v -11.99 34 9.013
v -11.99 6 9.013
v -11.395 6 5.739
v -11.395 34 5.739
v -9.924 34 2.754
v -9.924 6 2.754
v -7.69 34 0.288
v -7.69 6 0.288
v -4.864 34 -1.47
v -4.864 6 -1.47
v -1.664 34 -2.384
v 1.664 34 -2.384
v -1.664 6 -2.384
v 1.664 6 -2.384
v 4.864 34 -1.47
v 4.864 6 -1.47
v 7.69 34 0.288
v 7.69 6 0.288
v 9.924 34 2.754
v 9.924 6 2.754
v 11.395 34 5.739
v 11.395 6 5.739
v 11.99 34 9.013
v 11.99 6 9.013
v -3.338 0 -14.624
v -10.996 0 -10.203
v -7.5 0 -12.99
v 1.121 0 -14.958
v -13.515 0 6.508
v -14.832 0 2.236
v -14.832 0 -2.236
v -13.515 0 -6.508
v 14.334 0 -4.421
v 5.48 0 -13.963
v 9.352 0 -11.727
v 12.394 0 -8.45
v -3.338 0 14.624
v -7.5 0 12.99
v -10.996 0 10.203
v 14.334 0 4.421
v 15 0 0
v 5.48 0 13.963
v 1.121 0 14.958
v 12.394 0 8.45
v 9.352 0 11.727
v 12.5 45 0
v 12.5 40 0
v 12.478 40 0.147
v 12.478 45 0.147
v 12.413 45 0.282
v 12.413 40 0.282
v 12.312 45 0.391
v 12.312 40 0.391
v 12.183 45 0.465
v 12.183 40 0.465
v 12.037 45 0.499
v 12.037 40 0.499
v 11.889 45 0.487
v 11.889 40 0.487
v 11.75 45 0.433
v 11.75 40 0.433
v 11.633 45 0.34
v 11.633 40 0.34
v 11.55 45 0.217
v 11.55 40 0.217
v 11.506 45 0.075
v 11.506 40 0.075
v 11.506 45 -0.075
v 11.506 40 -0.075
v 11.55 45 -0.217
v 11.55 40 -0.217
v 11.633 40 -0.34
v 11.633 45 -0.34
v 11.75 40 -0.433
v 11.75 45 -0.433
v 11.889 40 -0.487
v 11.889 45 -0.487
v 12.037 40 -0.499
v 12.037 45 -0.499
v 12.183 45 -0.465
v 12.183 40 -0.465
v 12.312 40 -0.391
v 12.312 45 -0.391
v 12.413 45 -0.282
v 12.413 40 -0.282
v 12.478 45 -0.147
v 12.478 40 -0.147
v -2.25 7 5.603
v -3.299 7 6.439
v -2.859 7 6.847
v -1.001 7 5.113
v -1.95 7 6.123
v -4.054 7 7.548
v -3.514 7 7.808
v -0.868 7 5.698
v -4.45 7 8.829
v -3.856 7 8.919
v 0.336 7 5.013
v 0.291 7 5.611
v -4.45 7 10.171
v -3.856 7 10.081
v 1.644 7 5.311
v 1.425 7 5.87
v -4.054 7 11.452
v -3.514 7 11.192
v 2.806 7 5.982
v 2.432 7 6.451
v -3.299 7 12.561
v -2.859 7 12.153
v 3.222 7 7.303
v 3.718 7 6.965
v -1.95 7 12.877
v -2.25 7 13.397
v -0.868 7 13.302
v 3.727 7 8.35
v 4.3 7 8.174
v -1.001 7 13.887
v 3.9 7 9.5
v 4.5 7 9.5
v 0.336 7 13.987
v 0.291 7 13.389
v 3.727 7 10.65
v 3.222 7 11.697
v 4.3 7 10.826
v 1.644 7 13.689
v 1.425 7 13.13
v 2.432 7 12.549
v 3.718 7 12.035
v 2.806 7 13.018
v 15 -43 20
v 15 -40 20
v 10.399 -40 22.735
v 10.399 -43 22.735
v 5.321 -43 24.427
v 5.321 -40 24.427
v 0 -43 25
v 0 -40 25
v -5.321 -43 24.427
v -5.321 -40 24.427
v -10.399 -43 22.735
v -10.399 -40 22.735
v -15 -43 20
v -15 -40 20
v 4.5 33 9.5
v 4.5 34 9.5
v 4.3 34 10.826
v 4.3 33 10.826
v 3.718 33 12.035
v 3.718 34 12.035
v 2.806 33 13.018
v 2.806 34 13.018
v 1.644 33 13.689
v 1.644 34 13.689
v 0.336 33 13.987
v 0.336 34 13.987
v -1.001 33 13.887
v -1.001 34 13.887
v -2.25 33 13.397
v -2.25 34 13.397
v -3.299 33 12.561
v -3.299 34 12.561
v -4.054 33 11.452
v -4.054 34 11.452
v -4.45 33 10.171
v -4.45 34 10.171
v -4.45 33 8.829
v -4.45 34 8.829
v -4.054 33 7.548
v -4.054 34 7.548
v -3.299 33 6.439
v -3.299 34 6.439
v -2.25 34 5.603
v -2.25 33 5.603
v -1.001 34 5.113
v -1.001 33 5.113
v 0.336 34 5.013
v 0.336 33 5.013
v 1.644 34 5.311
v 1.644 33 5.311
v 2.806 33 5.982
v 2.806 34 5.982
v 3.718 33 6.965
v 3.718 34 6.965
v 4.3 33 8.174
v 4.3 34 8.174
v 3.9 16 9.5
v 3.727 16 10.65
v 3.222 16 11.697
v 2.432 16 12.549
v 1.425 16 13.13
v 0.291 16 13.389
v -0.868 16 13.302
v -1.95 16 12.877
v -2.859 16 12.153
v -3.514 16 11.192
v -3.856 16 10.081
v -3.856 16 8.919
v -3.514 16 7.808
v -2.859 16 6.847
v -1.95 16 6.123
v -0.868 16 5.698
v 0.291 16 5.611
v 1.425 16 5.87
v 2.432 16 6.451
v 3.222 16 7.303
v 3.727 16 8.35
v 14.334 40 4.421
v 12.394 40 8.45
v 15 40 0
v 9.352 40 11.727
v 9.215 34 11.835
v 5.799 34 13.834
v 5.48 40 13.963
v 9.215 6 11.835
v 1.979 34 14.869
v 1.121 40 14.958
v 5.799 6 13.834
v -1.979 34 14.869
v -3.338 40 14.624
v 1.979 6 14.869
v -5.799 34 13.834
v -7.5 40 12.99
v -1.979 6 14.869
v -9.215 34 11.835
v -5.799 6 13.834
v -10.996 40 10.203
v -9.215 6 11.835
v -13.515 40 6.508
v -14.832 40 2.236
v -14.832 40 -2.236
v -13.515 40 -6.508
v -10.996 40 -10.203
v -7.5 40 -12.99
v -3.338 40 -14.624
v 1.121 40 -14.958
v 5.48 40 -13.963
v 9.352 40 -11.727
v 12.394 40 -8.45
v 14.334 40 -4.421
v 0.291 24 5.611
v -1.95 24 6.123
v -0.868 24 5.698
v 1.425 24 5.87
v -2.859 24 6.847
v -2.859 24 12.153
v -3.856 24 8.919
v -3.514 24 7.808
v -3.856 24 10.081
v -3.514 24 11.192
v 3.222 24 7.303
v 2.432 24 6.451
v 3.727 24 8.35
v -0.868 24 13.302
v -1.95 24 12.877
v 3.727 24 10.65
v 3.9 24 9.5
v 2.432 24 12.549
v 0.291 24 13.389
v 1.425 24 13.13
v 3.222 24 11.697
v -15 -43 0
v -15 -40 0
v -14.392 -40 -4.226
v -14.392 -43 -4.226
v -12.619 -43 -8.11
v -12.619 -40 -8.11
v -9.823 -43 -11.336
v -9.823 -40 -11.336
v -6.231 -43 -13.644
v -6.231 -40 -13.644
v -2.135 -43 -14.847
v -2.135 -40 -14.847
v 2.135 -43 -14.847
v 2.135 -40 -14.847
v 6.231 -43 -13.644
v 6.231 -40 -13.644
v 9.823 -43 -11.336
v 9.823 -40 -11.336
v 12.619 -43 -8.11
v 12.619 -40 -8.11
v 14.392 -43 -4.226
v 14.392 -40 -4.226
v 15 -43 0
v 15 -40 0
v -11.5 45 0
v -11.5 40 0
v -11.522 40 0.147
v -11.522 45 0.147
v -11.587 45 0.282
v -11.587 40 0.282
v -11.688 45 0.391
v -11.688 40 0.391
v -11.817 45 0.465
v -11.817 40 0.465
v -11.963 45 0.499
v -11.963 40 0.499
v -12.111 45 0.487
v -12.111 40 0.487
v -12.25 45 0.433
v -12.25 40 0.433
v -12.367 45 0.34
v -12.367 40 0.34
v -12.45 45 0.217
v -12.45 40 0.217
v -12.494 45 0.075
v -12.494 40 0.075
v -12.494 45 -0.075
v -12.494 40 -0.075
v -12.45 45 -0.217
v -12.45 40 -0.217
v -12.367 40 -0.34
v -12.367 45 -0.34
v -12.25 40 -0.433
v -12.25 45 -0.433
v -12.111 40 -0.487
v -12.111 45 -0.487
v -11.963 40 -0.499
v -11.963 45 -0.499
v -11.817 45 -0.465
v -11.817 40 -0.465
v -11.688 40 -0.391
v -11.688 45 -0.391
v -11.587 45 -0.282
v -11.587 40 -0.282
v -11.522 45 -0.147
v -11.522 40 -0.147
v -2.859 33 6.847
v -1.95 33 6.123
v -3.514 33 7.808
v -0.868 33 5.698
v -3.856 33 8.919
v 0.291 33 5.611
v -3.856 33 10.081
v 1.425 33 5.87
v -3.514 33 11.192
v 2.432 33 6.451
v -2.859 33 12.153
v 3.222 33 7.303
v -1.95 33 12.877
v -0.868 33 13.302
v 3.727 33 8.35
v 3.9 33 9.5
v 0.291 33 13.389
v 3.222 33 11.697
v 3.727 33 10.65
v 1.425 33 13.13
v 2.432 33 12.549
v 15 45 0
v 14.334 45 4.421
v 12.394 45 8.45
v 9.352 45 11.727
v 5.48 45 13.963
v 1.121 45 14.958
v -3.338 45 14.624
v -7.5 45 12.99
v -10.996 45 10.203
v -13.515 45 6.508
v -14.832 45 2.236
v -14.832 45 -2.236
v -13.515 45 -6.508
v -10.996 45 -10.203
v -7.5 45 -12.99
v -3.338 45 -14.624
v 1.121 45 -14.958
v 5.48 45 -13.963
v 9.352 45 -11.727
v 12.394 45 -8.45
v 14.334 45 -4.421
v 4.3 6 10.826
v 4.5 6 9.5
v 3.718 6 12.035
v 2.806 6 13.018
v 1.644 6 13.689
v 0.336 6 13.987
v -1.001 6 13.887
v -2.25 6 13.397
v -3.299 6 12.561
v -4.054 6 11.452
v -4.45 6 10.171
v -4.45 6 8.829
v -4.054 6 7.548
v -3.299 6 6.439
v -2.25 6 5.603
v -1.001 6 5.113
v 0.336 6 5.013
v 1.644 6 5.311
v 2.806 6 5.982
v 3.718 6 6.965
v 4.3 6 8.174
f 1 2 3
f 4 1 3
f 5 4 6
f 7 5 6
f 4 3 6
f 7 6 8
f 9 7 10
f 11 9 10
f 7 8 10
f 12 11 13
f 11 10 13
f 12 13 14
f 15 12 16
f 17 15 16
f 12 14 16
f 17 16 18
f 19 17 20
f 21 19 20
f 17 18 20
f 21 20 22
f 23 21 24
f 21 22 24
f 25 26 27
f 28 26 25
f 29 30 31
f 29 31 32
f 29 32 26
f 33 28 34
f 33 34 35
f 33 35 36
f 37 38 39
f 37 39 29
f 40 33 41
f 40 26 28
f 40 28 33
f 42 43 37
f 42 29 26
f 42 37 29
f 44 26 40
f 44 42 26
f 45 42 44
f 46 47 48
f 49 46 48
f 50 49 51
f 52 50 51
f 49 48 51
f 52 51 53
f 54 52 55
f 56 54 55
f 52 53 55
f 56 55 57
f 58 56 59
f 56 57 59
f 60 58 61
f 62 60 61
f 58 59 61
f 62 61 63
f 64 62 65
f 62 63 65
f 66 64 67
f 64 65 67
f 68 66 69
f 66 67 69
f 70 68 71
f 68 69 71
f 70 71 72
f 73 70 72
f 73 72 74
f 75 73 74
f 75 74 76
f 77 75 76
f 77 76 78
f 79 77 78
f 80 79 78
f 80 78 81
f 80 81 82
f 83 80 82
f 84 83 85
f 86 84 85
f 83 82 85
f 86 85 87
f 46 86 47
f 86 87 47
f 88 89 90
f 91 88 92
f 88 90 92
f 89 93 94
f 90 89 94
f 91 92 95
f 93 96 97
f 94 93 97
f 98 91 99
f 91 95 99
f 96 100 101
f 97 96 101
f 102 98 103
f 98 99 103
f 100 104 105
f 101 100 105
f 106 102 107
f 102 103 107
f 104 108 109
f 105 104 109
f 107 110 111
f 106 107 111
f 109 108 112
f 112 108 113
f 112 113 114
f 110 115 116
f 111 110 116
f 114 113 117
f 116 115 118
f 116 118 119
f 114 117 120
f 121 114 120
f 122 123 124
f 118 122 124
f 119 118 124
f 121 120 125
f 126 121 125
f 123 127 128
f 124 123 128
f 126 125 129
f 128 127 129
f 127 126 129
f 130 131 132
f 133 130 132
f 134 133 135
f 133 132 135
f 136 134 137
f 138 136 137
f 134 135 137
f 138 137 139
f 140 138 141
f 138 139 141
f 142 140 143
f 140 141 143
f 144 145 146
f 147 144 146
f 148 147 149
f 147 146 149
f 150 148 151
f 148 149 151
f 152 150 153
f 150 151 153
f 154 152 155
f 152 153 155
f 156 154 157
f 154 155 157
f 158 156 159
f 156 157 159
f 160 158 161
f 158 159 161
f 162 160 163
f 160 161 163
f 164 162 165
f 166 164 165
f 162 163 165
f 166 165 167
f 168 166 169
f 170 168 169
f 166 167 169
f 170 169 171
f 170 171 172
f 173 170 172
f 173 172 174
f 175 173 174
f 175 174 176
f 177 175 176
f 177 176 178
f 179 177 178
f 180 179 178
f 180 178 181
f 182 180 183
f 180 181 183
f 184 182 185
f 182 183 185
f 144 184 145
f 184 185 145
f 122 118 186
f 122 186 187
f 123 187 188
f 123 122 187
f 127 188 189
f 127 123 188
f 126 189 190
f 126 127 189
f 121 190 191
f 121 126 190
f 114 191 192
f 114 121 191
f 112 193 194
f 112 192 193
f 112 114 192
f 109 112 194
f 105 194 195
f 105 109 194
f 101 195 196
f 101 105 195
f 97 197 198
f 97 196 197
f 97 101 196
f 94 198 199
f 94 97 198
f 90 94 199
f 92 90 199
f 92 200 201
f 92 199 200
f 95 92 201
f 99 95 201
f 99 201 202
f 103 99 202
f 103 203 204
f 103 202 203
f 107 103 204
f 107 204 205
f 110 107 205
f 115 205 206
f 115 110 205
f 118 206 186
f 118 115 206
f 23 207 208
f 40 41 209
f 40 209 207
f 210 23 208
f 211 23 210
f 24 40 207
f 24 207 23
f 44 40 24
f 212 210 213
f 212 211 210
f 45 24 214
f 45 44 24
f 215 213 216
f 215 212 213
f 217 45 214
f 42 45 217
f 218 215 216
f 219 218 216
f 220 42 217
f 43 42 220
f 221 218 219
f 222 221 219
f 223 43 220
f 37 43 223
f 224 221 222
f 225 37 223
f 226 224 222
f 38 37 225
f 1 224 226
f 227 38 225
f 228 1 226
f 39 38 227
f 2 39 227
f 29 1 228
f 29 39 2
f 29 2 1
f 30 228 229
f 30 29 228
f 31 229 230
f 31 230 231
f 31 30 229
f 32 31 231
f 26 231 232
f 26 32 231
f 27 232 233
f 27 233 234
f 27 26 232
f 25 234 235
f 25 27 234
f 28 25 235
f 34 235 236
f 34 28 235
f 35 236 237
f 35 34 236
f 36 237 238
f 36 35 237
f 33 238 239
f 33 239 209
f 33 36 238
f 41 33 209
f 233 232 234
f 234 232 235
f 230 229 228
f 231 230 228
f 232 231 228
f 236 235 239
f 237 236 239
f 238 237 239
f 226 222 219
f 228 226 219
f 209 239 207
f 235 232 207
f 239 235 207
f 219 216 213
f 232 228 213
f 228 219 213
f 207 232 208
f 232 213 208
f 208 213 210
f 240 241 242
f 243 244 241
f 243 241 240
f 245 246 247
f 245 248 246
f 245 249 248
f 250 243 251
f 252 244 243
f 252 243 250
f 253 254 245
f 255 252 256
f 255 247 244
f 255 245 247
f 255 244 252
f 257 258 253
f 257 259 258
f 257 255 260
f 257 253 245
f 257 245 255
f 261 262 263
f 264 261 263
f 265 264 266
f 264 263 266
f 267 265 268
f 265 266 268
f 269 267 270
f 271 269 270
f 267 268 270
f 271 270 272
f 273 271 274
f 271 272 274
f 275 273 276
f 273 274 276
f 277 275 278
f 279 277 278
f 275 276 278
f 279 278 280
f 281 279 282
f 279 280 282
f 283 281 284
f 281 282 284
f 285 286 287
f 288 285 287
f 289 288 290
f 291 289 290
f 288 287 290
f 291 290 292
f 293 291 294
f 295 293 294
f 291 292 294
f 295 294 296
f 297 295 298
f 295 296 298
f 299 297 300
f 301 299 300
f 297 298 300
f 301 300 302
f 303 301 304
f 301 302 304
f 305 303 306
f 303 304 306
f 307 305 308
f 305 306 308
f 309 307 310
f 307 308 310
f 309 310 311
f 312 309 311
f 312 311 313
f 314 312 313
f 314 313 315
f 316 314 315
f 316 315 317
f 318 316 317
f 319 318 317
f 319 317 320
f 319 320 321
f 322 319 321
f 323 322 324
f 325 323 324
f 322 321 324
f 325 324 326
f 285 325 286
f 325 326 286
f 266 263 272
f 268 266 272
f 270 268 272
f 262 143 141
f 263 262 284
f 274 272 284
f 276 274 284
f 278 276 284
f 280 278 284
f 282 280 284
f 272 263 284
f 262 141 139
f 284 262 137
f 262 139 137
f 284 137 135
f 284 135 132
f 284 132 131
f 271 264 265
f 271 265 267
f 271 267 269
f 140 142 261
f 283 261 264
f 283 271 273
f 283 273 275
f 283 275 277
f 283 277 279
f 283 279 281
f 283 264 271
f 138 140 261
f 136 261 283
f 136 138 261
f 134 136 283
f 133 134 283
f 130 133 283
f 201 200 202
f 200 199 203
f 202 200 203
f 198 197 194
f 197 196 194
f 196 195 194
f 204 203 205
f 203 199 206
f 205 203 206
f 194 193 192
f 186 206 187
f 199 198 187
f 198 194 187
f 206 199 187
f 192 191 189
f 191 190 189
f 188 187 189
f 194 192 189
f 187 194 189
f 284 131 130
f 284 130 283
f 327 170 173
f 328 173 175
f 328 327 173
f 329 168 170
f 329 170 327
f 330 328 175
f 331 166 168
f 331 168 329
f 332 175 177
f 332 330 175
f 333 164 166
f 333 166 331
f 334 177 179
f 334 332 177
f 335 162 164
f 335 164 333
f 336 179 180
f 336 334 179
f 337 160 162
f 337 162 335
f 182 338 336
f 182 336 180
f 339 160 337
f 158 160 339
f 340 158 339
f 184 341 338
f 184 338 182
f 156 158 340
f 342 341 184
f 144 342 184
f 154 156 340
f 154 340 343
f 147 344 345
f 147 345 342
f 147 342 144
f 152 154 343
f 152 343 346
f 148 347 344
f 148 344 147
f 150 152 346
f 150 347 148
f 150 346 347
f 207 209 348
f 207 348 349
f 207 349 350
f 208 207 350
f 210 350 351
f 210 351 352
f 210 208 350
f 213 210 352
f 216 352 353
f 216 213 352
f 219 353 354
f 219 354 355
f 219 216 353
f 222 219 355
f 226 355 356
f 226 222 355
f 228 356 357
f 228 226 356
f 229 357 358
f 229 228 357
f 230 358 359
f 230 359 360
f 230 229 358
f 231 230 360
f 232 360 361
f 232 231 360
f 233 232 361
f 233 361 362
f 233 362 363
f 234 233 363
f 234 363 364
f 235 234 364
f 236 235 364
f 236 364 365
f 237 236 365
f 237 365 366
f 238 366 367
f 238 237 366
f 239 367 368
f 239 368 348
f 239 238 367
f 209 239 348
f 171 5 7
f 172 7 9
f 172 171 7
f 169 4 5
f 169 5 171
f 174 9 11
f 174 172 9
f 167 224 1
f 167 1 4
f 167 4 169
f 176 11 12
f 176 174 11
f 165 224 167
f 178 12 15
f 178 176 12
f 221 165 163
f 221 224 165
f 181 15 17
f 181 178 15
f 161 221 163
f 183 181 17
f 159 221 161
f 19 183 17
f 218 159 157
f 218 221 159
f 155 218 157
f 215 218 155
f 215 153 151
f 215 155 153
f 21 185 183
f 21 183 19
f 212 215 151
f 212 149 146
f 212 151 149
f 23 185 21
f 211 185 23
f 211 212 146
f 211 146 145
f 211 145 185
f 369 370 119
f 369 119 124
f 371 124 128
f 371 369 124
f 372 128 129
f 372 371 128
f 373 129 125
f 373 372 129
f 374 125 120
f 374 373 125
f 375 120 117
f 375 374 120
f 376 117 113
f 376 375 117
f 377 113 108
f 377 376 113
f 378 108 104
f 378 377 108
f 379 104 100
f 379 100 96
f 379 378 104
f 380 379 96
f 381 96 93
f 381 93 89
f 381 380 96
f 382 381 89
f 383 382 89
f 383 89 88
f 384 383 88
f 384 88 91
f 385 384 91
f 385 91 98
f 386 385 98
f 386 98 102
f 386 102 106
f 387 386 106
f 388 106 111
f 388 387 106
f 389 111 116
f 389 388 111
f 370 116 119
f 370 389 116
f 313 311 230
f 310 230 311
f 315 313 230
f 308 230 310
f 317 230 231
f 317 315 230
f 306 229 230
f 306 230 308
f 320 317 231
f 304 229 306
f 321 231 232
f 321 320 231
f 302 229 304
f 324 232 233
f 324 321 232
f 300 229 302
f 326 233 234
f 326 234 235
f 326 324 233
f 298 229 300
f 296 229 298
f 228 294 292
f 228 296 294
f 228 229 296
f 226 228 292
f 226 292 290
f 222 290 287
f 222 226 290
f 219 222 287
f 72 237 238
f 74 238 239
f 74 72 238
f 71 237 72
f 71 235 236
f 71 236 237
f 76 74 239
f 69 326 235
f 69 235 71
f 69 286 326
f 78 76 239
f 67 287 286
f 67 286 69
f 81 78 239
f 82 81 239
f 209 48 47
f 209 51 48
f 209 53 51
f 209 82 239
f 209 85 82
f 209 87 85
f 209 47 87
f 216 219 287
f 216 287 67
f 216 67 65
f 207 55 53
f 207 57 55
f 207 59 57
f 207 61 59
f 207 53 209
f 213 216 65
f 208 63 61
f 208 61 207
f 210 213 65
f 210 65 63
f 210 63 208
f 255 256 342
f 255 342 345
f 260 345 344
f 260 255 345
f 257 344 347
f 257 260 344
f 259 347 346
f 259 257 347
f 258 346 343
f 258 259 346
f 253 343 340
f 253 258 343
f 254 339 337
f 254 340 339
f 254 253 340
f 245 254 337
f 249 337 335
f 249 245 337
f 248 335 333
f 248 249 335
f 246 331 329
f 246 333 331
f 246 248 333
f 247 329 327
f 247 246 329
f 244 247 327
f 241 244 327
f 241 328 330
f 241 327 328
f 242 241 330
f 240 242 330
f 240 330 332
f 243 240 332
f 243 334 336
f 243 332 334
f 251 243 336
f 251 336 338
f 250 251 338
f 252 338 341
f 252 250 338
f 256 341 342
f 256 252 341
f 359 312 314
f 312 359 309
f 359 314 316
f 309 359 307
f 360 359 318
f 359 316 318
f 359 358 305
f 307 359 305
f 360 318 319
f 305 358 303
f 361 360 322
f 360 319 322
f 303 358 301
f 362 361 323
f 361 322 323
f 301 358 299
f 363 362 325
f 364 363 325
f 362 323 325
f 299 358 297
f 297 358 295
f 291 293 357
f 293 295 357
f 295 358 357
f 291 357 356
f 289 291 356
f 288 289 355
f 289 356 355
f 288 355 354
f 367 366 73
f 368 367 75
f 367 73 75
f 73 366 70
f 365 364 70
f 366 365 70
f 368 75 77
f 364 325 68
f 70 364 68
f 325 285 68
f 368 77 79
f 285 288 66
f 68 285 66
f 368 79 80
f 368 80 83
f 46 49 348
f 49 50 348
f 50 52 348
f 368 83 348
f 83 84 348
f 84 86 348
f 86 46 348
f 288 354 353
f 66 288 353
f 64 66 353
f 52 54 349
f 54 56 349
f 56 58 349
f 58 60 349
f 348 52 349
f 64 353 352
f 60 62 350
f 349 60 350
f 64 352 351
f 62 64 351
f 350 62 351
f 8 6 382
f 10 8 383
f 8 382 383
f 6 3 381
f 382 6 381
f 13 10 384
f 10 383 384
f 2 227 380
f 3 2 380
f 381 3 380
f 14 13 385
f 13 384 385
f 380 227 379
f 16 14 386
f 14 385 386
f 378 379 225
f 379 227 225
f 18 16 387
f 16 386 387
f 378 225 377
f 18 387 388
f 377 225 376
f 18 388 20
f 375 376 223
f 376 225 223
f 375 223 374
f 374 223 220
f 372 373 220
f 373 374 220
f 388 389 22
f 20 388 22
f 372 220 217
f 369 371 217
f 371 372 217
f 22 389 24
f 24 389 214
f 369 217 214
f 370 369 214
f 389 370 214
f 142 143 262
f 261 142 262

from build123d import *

# Parameters (mm, degrees)
SKETCH_R        = 15
PAD_DEPTH       = 40
SKETCH001_R     = 12
POCKET_DEPTH    = 28
SKETCH002_R     = 3.9
PAD001_DEPTH    = 28
SKETCH003_R     = 4.564184
POCKET001_DEPTH = 4
SKETCH004_R     = 4.5
PAD002_DEPTH    = 1
SKETCH005_R     = 4.5
PAD003_DEPTH    = 1
PAD004_DEPTH    = 3
SKETCH008_R     = 0.5
POCKET002_DEPTH = 10
SKETCH007_R     = 15
SKETCH007_R_2   = 0.5
EXTRUDE_DEPTH   = 5


with BuildPart() as roulements:
    # Sketch → Pad (new body)
    with BuildSketch(Plane.XZ):
        Circle(SKETCH_R)
    extrude(amount=PAD_DEPTH)

    # Sketch001 → Pocket (cut)
    with BuildSketch(Plane.XZ.offset(6)):
        with Locations((0, 9.5)):
            Circle(SKETCH001_R)
    extrude(amount=POCKET_DEPTH, mode=Mode.SUBTRACT)

    # Sketch002 → Pad001 (join)
    with BuildSketch(Plane.XZ.offset(6)):
        with Locations((0, 9.5)):
            Circle(SKETCH002_R)
    extrude(amount=PAD001_DEPTH)

    # Sketch003 → Pocket001 (cut, symmetric)
    with BuildSketch(Plane.XZ.offset(20)):
        with Locations((0, 9.500001)):
            Circle(SKETCH003_R)
    extrude(amount=POCKET001_DEPTH, both=True, mode=Mode.SUBTRACT)

    # Sketch004 → Pad002 (join)
    with BuildSketch(Plane.XZ.offset(6)):
        with Locations((0, 9.5)):
            Circle(SKETCH004_R)
    extrude(amount=PAD002_DEPTH)

    # Sketch005 → Pad003 (join)
    with BuildSketch(Plane.XZ.offset(34)):
        with Locations((0, 9.5)):
            Circle(SKETCH005_R)
    extrude(amount=-PAD003_DEPTH)


with BuildPart() as part_mirroring:
    # Part__Mirroring: instance of roulements
    add(roulements.part.mirror(Plane(origin=(0, 0, 0), x_dir=(1, 0, 0), z_dir=(0, 1, 0))))


with BuildPart() as butee:
    # Sketch006 → Pad004 (new body)
    with BuildSketch(Plane.XZ.offset(40)):
        with BuildLine():
            ThreePointArc((15, 20), (0, 25), (-15, 20))
            Line((-15, 20), (-15, 0))
            ThreePointArc((-15, 0), (-4e-06, -15), (15, -9e-06))
            Line((15, 20), (15, -9e-06))
        make_face()
    extrude(amount=PAD004_DEPTH)

    # Sketch008 → Pocket002 (cut)
    with BuildSketch(Plane.XZ.offset(-45)):
        with Locations((-12, 0)):
            Circle(SKETCH008_R)
        with Locations((12, 0)):
            Circle(SKETCH008_R)
    extrude(amount=POCKET002_DEPTH, mode=Mode.SUBTRACT)


with BuildPart() as extrude_body:
    # Sketch007 → Extrude (new body)
    with BuildSketch(Plane.XZ.offset(-40)):
        Circle(SKETCH007_R)
        with Locations((-12, 0)):
            Circle(SKETCH007_R_2, mode=Mode.SUBTRACT)
        with Locations((12, 0)):
            Circle(SKETCH007_R_2, mode=Mode.SUBTRACT)
    extrude(amount=-EXTRUDE_DEPTH)


solid = Compound([part_mirroring.part, butee.part, extrude_body.part])
